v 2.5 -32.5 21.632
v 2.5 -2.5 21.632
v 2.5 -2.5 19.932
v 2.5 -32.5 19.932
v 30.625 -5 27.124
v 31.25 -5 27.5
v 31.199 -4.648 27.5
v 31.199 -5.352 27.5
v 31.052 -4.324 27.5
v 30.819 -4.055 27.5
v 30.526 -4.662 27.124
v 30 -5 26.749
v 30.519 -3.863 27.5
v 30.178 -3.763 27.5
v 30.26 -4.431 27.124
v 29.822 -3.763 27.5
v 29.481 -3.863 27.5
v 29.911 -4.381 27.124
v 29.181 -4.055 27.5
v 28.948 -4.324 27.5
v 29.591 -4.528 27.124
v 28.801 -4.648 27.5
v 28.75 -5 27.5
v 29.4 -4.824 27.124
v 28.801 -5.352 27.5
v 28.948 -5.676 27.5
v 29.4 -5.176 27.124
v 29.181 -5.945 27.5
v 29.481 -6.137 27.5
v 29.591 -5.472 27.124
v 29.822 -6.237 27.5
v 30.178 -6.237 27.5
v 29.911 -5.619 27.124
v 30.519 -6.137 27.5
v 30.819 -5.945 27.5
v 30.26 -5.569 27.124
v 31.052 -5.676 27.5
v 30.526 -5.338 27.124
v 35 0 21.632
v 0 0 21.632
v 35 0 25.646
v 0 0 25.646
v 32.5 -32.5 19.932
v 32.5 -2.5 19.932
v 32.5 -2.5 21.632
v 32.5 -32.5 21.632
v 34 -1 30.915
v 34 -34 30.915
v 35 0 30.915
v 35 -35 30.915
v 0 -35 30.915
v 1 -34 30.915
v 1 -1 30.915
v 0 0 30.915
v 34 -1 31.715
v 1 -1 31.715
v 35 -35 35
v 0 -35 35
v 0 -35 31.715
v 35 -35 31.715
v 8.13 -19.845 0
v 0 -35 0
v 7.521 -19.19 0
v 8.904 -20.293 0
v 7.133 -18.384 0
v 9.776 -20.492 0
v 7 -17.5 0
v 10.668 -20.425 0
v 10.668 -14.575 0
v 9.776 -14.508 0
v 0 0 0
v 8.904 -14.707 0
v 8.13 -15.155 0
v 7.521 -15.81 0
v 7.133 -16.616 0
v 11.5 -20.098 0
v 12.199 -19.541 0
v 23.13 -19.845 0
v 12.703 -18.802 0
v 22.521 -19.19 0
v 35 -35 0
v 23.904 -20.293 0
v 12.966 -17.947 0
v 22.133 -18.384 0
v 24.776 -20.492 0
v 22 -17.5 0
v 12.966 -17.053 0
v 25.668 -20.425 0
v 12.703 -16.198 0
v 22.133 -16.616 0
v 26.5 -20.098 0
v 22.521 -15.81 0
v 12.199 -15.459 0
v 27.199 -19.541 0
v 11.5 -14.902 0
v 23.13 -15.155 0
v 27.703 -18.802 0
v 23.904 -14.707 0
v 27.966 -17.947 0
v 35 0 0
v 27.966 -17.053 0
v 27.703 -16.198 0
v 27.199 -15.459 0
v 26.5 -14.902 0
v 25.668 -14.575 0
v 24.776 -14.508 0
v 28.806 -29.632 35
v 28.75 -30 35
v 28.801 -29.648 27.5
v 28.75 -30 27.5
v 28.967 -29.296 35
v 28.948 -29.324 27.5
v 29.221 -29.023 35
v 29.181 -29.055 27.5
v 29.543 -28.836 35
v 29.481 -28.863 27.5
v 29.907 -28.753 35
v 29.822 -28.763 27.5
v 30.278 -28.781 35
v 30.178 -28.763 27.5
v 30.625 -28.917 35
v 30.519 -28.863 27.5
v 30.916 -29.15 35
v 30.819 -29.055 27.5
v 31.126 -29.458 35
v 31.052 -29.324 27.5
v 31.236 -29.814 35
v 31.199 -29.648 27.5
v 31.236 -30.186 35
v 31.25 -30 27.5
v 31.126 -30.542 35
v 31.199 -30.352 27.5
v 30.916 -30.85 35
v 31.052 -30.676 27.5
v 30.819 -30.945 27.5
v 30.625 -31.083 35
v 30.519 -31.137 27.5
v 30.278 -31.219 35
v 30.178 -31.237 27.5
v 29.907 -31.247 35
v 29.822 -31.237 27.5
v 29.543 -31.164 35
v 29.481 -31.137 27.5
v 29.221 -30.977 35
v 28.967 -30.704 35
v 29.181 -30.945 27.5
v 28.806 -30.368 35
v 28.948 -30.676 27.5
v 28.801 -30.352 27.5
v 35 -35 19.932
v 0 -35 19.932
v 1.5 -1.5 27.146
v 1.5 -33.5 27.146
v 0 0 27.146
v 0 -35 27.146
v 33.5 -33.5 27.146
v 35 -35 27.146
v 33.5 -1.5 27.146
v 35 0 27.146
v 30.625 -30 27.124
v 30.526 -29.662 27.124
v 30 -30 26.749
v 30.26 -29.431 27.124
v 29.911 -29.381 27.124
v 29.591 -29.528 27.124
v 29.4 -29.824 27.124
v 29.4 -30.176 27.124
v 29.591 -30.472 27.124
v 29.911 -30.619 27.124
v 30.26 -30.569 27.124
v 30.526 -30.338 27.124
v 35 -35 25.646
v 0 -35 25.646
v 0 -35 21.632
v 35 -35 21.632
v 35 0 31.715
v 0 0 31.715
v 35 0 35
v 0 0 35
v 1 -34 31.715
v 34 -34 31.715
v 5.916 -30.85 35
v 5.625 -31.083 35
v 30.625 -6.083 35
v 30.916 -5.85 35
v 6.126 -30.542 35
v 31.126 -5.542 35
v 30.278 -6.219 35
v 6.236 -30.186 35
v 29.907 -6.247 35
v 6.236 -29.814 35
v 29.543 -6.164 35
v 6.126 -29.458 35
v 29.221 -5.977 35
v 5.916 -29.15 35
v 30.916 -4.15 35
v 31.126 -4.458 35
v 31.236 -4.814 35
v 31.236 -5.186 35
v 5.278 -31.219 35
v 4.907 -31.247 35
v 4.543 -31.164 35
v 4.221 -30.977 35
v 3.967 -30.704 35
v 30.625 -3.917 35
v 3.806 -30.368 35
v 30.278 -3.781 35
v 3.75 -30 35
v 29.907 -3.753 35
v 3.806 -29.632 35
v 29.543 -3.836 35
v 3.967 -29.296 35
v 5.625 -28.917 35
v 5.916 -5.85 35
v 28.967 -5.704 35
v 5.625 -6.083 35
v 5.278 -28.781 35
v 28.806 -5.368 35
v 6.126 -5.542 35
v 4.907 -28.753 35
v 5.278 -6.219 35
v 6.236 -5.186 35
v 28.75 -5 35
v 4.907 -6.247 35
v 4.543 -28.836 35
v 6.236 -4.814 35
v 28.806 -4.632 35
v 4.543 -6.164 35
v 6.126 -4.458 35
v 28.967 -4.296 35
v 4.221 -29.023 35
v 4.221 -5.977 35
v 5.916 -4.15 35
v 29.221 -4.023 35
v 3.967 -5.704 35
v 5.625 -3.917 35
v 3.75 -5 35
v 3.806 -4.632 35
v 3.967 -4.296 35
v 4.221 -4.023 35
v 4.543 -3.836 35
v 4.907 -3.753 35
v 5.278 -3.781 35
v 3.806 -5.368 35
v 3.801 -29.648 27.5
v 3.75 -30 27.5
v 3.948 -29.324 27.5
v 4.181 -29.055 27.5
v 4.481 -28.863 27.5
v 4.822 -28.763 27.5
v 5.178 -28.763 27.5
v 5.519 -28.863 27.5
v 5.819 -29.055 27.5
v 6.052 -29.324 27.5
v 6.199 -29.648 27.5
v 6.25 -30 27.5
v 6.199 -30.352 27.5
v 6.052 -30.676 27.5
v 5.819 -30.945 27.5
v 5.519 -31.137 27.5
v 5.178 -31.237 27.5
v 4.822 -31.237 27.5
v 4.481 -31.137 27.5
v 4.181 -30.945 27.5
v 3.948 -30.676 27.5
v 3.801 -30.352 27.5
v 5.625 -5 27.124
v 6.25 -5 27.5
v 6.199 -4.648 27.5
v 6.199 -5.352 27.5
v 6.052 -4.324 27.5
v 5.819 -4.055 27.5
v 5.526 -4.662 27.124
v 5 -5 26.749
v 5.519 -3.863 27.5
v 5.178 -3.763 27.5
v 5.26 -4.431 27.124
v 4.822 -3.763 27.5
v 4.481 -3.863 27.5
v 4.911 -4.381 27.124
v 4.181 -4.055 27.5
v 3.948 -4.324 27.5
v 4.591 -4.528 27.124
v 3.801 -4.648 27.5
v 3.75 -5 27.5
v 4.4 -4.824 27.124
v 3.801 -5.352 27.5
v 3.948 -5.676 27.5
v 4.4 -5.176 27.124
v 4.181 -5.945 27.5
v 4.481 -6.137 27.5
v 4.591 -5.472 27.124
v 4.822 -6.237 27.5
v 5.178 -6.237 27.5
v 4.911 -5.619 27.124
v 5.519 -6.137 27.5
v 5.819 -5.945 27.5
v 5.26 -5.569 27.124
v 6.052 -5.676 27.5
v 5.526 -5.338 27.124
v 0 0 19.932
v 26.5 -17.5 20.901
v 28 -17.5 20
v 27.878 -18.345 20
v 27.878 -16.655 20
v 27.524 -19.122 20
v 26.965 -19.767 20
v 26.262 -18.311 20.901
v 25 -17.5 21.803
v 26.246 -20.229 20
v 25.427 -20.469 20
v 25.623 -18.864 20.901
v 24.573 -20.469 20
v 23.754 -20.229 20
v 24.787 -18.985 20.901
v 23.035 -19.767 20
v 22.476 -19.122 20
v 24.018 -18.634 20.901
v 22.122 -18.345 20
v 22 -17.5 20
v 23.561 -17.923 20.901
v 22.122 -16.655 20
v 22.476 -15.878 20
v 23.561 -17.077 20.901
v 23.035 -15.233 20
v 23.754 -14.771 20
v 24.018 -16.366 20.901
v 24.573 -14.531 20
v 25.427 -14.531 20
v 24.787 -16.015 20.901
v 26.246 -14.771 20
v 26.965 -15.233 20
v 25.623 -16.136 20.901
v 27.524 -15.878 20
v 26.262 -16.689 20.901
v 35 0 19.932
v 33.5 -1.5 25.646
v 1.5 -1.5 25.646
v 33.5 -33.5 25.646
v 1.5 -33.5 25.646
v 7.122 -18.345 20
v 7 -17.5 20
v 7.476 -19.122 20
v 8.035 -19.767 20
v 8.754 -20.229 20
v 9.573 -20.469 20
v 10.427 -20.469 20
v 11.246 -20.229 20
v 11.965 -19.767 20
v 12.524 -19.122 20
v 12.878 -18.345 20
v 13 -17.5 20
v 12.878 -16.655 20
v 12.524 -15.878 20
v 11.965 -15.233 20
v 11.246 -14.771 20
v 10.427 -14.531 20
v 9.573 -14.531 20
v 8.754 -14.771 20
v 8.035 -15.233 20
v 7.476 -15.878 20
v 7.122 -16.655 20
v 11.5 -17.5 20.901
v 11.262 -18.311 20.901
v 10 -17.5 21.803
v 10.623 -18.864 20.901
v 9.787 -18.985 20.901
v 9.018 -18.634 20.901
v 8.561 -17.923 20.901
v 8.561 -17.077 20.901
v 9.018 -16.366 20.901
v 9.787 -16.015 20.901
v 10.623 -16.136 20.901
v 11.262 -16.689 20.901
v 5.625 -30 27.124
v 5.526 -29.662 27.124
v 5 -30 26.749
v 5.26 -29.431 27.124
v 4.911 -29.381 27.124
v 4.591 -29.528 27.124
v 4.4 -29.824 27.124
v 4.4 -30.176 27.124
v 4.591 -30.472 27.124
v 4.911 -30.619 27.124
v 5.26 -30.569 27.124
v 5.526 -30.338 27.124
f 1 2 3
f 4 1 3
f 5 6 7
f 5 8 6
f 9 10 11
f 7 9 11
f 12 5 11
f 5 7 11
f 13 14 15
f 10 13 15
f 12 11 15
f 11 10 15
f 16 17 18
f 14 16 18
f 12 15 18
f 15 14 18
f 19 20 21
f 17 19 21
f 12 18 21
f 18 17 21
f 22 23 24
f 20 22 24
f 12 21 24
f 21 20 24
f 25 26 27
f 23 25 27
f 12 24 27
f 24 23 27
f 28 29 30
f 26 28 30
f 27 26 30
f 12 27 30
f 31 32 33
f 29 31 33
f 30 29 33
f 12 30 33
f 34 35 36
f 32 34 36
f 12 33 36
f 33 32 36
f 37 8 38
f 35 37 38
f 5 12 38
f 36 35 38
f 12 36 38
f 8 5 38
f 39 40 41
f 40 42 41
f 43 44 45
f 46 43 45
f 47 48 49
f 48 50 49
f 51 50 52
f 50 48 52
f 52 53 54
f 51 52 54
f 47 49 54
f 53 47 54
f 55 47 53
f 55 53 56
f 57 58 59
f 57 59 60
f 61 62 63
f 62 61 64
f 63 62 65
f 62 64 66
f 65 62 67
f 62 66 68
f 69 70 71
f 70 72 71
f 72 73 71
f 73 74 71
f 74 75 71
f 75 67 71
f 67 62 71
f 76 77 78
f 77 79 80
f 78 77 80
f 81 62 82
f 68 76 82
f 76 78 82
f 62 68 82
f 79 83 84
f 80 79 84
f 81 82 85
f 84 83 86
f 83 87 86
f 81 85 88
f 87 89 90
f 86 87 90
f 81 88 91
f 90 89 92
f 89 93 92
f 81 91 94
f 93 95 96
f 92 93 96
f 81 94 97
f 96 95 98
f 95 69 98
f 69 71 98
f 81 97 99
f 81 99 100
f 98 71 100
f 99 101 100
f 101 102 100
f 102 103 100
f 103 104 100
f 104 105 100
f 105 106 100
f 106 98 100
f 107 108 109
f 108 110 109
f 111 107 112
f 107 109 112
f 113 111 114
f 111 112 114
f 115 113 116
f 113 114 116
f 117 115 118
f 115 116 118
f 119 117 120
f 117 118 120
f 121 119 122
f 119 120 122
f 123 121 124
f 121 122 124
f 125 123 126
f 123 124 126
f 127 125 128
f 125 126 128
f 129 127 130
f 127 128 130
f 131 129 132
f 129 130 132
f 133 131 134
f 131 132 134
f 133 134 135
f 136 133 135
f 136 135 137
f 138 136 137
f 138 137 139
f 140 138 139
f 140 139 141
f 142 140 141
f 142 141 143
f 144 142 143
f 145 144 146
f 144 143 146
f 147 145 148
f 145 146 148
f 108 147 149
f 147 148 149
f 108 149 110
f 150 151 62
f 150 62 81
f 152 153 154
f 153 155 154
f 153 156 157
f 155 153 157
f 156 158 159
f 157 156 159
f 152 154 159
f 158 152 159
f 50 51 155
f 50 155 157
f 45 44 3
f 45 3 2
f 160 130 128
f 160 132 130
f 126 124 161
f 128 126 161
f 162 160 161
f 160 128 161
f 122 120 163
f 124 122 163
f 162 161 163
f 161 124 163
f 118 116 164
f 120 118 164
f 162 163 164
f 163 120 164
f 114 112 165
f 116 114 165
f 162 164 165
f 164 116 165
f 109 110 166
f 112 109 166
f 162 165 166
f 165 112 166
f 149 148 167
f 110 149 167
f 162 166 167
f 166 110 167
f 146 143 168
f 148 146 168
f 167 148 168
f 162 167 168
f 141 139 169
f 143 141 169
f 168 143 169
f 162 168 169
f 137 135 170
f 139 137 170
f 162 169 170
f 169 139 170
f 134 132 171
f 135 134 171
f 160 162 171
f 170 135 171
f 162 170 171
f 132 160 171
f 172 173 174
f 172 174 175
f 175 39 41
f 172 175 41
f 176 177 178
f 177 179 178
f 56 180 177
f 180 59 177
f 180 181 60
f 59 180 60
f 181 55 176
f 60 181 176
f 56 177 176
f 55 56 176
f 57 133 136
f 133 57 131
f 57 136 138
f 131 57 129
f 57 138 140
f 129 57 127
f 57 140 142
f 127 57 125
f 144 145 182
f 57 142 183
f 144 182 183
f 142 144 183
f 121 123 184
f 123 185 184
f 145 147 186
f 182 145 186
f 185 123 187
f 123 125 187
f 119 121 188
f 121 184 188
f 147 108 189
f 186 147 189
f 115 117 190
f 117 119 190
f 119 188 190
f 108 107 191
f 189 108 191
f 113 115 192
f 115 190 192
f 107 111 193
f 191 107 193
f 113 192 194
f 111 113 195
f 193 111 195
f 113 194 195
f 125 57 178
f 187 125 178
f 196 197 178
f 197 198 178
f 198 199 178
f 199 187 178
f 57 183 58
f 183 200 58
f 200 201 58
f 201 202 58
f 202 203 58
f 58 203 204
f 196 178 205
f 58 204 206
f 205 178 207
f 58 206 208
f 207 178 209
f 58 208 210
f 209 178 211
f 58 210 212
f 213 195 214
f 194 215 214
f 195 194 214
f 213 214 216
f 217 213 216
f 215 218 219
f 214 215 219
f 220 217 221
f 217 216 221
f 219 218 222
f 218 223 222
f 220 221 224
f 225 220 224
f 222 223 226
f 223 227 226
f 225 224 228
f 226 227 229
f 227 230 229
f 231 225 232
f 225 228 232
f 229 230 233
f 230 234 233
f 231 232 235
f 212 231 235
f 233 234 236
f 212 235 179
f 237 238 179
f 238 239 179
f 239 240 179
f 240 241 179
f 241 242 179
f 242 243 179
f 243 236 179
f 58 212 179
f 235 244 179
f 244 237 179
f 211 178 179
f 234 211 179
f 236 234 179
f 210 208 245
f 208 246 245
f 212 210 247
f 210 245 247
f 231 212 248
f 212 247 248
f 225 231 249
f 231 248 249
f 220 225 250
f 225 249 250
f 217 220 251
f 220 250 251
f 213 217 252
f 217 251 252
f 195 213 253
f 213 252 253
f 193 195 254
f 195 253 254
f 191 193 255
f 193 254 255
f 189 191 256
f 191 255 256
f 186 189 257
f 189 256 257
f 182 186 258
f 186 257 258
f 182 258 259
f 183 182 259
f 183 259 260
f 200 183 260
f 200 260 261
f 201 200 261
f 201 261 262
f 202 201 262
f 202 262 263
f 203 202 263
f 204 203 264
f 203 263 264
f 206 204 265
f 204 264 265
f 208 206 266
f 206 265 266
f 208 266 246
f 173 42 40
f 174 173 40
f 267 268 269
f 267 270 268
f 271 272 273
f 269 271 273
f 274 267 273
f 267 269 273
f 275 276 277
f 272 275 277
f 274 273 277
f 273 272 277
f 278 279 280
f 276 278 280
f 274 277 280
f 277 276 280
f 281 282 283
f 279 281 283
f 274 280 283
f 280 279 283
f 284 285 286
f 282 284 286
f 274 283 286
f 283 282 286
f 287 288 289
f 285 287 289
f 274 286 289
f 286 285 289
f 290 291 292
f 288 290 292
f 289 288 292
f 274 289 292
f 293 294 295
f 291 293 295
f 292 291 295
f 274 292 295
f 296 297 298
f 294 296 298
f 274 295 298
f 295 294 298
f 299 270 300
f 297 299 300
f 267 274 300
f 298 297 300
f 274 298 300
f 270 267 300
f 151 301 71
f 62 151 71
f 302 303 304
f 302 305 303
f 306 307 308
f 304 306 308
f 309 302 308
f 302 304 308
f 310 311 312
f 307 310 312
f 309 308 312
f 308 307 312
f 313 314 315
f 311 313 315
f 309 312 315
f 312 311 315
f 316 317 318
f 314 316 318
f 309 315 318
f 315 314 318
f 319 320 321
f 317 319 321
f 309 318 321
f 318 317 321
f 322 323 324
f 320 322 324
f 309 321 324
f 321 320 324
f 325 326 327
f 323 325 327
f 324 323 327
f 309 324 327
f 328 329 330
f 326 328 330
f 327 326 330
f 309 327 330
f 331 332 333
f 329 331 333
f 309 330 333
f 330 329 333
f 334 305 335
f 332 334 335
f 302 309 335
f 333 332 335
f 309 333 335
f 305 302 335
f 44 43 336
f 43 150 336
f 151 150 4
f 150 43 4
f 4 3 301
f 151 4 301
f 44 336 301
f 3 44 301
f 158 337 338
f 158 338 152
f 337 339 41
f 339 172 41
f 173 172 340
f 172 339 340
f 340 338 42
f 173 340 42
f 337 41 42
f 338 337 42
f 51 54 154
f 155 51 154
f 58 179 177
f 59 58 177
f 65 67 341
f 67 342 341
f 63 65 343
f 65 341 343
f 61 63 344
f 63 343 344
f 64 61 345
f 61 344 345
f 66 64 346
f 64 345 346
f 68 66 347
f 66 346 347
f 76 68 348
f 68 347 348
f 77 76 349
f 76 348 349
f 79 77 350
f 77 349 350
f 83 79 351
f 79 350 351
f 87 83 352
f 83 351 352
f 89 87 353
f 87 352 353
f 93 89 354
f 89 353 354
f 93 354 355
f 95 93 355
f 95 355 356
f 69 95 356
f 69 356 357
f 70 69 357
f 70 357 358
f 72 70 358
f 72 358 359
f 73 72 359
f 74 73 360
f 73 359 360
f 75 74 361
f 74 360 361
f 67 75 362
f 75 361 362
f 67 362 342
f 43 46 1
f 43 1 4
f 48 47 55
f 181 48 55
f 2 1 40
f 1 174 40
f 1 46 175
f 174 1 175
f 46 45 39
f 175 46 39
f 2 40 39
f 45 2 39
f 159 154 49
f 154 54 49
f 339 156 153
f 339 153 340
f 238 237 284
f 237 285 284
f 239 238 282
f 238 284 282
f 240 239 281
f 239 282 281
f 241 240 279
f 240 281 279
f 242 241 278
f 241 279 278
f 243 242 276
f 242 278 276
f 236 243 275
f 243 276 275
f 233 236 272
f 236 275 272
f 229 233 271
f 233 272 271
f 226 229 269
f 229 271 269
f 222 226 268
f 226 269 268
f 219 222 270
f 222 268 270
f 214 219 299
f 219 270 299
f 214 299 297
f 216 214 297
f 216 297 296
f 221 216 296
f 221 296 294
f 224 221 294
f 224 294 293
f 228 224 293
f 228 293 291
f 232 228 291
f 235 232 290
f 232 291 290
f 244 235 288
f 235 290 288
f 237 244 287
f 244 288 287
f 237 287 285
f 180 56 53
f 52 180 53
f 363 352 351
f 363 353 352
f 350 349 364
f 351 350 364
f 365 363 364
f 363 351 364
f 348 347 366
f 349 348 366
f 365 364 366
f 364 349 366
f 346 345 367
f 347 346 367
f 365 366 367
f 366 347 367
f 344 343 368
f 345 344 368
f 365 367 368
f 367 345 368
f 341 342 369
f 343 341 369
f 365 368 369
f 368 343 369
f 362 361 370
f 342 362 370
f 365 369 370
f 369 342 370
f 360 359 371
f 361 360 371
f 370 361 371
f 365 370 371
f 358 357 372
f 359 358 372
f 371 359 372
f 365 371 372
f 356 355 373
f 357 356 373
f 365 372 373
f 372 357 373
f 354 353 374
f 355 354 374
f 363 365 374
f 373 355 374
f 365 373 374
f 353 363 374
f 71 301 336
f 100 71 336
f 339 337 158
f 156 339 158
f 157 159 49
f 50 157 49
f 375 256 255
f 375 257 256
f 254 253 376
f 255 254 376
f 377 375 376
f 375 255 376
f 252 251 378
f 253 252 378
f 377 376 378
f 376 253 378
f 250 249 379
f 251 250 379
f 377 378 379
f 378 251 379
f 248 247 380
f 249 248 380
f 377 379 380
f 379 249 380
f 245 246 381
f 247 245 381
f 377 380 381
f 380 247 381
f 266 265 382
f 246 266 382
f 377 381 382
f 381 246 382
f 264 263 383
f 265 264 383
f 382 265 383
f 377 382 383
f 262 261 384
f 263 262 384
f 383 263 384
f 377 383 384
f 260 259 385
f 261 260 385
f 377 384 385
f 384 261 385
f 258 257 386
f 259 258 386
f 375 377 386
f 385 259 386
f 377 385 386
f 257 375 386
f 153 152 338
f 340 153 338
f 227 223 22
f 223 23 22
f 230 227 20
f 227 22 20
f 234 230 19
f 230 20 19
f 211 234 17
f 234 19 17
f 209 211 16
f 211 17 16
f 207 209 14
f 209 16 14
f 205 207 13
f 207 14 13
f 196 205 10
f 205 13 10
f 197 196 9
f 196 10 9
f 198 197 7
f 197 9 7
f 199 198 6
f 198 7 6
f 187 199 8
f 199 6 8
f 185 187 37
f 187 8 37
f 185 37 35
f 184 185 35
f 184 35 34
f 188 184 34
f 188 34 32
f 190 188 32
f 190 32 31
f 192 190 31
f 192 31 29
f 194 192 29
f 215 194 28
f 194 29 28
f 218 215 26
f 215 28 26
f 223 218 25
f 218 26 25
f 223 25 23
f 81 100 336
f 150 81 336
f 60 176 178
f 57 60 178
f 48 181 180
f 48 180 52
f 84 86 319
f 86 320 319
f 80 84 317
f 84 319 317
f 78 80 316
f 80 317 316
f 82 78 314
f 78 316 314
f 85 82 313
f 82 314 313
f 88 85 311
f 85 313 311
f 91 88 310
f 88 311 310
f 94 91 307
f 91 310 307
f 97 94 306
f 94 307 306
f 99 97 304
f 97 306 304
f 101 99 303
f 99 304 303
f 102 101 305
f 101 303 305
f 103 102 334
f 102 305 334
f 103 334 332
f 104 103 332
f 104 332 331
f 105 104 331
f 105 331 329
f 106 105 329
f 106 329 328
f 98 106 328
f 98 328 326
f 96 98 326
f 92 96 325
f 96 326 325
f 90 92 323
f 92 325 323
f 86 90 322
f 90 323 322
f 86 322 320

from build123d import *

# Parameters (mm, degrees)
F1_DEPTH = 35
F3_D     = 6
F3_DEPTH = 20
F3_TIP   = 1.8025818571
F5_DEPTH = 35
F7_D     = 2.5
F7_DEPTH = 7.5
F7_TIP   = 0.7510757738


with BuildPart() as f1:
    # F0 (on Front) → F1 (new body)
    with BuildSketch(Plane.XZ):
        Polygon((0, 19.931551069), (0, 0), (35, 0), (35, 19.931551069), (32.5, 19.931551069), (32.5, 21.631551069), (35, 21.631551069), (35, 25.6460141391), (33.5, 25.6460141391), (33.5, 27.1460141391), (35, 27.1460141391), (35, 30.9151932597), (34, 30.9151932597), (34, 31.7151932597), (35, 31.7151932597), (35, 35), (0, 35), (0, 31.7151932597), (1, 31.7151932597), (1, 30.9151932597), (0, 30.9151932597), (0, 27.1460141391), (1.5, 27.1460141391), (1.5, 25.6460141391), (0, 25.6460141391), (0, 21.631551069), (2.5, 21.631551069), (2.5, 19.931551069), align=None)
    extrude(amount=F1_DEPTH)

    # F3
    with Locations(Plane(origin=(0, 0, 0), x_dir=(1, 0, 0), z_dir=(0, 0, -1))):
        with Locations((10, 17.5), (25, 17.5)):
            Hole(F3_D / 2, depth=F3_DEPTH)
            with Locations((0, 0, -(F3_DEPTH + F3_TIP / 2))):  # 118° drill point
                Cone(0, F3_D / 2, F3_TIP, mode=Mode.SUBTRACT)

    # F4 (on face) → F5 (intersect)
    with BuildSketch(Plane.YZ.offset(35)):
        Polygon((-35, 19.931551069), (-35, 0), (0, 0), (0, 19.931551069), (-2.5, 19.931551069), (-2.5, 21.631551069), (0, 21.631551069), (0, 25.6460141391), (-1.5, 25.6460141391), (-1.5, 27.1460141391), (0, 27.1460141391), (0, 30.9151932597), (-1, 30.9151932597), (-1, 31.7151932597), (0, 31.7151932597), (0, 35), (-35, 35), (-35, 31.7151932597), (-34, 31.7151932597), (-34, 30.9151932597), (-35, 30.9151932597), (-35, 27.1460141391), (-33.5, 27.1460141391), (-33.5, 25.6460141391), (-35, 25.6460141391), (-35, 21.631551069), (-32.5, 21.631551069), (-32.5, 19.931551069), align=None)
    extrude(amount=-F5_DEPTH, mode=Mode.INTERSECT)

    # F7
    with Locations(Plane.XY.offset(35)):
        with Locations((30, -30), (30, -5), (5, -5), (5, -30)):
            Hole(F7_D / 2, depth=F7_DEPTH)
            with Locations((0, 0, -(F7_DEPTH + F7_TIP / 2))):  # 118° drill point
                Cone(0, F7_D / 2, F7_TIP, mode=Mode.SUBTRACT)


solid = f1.part
